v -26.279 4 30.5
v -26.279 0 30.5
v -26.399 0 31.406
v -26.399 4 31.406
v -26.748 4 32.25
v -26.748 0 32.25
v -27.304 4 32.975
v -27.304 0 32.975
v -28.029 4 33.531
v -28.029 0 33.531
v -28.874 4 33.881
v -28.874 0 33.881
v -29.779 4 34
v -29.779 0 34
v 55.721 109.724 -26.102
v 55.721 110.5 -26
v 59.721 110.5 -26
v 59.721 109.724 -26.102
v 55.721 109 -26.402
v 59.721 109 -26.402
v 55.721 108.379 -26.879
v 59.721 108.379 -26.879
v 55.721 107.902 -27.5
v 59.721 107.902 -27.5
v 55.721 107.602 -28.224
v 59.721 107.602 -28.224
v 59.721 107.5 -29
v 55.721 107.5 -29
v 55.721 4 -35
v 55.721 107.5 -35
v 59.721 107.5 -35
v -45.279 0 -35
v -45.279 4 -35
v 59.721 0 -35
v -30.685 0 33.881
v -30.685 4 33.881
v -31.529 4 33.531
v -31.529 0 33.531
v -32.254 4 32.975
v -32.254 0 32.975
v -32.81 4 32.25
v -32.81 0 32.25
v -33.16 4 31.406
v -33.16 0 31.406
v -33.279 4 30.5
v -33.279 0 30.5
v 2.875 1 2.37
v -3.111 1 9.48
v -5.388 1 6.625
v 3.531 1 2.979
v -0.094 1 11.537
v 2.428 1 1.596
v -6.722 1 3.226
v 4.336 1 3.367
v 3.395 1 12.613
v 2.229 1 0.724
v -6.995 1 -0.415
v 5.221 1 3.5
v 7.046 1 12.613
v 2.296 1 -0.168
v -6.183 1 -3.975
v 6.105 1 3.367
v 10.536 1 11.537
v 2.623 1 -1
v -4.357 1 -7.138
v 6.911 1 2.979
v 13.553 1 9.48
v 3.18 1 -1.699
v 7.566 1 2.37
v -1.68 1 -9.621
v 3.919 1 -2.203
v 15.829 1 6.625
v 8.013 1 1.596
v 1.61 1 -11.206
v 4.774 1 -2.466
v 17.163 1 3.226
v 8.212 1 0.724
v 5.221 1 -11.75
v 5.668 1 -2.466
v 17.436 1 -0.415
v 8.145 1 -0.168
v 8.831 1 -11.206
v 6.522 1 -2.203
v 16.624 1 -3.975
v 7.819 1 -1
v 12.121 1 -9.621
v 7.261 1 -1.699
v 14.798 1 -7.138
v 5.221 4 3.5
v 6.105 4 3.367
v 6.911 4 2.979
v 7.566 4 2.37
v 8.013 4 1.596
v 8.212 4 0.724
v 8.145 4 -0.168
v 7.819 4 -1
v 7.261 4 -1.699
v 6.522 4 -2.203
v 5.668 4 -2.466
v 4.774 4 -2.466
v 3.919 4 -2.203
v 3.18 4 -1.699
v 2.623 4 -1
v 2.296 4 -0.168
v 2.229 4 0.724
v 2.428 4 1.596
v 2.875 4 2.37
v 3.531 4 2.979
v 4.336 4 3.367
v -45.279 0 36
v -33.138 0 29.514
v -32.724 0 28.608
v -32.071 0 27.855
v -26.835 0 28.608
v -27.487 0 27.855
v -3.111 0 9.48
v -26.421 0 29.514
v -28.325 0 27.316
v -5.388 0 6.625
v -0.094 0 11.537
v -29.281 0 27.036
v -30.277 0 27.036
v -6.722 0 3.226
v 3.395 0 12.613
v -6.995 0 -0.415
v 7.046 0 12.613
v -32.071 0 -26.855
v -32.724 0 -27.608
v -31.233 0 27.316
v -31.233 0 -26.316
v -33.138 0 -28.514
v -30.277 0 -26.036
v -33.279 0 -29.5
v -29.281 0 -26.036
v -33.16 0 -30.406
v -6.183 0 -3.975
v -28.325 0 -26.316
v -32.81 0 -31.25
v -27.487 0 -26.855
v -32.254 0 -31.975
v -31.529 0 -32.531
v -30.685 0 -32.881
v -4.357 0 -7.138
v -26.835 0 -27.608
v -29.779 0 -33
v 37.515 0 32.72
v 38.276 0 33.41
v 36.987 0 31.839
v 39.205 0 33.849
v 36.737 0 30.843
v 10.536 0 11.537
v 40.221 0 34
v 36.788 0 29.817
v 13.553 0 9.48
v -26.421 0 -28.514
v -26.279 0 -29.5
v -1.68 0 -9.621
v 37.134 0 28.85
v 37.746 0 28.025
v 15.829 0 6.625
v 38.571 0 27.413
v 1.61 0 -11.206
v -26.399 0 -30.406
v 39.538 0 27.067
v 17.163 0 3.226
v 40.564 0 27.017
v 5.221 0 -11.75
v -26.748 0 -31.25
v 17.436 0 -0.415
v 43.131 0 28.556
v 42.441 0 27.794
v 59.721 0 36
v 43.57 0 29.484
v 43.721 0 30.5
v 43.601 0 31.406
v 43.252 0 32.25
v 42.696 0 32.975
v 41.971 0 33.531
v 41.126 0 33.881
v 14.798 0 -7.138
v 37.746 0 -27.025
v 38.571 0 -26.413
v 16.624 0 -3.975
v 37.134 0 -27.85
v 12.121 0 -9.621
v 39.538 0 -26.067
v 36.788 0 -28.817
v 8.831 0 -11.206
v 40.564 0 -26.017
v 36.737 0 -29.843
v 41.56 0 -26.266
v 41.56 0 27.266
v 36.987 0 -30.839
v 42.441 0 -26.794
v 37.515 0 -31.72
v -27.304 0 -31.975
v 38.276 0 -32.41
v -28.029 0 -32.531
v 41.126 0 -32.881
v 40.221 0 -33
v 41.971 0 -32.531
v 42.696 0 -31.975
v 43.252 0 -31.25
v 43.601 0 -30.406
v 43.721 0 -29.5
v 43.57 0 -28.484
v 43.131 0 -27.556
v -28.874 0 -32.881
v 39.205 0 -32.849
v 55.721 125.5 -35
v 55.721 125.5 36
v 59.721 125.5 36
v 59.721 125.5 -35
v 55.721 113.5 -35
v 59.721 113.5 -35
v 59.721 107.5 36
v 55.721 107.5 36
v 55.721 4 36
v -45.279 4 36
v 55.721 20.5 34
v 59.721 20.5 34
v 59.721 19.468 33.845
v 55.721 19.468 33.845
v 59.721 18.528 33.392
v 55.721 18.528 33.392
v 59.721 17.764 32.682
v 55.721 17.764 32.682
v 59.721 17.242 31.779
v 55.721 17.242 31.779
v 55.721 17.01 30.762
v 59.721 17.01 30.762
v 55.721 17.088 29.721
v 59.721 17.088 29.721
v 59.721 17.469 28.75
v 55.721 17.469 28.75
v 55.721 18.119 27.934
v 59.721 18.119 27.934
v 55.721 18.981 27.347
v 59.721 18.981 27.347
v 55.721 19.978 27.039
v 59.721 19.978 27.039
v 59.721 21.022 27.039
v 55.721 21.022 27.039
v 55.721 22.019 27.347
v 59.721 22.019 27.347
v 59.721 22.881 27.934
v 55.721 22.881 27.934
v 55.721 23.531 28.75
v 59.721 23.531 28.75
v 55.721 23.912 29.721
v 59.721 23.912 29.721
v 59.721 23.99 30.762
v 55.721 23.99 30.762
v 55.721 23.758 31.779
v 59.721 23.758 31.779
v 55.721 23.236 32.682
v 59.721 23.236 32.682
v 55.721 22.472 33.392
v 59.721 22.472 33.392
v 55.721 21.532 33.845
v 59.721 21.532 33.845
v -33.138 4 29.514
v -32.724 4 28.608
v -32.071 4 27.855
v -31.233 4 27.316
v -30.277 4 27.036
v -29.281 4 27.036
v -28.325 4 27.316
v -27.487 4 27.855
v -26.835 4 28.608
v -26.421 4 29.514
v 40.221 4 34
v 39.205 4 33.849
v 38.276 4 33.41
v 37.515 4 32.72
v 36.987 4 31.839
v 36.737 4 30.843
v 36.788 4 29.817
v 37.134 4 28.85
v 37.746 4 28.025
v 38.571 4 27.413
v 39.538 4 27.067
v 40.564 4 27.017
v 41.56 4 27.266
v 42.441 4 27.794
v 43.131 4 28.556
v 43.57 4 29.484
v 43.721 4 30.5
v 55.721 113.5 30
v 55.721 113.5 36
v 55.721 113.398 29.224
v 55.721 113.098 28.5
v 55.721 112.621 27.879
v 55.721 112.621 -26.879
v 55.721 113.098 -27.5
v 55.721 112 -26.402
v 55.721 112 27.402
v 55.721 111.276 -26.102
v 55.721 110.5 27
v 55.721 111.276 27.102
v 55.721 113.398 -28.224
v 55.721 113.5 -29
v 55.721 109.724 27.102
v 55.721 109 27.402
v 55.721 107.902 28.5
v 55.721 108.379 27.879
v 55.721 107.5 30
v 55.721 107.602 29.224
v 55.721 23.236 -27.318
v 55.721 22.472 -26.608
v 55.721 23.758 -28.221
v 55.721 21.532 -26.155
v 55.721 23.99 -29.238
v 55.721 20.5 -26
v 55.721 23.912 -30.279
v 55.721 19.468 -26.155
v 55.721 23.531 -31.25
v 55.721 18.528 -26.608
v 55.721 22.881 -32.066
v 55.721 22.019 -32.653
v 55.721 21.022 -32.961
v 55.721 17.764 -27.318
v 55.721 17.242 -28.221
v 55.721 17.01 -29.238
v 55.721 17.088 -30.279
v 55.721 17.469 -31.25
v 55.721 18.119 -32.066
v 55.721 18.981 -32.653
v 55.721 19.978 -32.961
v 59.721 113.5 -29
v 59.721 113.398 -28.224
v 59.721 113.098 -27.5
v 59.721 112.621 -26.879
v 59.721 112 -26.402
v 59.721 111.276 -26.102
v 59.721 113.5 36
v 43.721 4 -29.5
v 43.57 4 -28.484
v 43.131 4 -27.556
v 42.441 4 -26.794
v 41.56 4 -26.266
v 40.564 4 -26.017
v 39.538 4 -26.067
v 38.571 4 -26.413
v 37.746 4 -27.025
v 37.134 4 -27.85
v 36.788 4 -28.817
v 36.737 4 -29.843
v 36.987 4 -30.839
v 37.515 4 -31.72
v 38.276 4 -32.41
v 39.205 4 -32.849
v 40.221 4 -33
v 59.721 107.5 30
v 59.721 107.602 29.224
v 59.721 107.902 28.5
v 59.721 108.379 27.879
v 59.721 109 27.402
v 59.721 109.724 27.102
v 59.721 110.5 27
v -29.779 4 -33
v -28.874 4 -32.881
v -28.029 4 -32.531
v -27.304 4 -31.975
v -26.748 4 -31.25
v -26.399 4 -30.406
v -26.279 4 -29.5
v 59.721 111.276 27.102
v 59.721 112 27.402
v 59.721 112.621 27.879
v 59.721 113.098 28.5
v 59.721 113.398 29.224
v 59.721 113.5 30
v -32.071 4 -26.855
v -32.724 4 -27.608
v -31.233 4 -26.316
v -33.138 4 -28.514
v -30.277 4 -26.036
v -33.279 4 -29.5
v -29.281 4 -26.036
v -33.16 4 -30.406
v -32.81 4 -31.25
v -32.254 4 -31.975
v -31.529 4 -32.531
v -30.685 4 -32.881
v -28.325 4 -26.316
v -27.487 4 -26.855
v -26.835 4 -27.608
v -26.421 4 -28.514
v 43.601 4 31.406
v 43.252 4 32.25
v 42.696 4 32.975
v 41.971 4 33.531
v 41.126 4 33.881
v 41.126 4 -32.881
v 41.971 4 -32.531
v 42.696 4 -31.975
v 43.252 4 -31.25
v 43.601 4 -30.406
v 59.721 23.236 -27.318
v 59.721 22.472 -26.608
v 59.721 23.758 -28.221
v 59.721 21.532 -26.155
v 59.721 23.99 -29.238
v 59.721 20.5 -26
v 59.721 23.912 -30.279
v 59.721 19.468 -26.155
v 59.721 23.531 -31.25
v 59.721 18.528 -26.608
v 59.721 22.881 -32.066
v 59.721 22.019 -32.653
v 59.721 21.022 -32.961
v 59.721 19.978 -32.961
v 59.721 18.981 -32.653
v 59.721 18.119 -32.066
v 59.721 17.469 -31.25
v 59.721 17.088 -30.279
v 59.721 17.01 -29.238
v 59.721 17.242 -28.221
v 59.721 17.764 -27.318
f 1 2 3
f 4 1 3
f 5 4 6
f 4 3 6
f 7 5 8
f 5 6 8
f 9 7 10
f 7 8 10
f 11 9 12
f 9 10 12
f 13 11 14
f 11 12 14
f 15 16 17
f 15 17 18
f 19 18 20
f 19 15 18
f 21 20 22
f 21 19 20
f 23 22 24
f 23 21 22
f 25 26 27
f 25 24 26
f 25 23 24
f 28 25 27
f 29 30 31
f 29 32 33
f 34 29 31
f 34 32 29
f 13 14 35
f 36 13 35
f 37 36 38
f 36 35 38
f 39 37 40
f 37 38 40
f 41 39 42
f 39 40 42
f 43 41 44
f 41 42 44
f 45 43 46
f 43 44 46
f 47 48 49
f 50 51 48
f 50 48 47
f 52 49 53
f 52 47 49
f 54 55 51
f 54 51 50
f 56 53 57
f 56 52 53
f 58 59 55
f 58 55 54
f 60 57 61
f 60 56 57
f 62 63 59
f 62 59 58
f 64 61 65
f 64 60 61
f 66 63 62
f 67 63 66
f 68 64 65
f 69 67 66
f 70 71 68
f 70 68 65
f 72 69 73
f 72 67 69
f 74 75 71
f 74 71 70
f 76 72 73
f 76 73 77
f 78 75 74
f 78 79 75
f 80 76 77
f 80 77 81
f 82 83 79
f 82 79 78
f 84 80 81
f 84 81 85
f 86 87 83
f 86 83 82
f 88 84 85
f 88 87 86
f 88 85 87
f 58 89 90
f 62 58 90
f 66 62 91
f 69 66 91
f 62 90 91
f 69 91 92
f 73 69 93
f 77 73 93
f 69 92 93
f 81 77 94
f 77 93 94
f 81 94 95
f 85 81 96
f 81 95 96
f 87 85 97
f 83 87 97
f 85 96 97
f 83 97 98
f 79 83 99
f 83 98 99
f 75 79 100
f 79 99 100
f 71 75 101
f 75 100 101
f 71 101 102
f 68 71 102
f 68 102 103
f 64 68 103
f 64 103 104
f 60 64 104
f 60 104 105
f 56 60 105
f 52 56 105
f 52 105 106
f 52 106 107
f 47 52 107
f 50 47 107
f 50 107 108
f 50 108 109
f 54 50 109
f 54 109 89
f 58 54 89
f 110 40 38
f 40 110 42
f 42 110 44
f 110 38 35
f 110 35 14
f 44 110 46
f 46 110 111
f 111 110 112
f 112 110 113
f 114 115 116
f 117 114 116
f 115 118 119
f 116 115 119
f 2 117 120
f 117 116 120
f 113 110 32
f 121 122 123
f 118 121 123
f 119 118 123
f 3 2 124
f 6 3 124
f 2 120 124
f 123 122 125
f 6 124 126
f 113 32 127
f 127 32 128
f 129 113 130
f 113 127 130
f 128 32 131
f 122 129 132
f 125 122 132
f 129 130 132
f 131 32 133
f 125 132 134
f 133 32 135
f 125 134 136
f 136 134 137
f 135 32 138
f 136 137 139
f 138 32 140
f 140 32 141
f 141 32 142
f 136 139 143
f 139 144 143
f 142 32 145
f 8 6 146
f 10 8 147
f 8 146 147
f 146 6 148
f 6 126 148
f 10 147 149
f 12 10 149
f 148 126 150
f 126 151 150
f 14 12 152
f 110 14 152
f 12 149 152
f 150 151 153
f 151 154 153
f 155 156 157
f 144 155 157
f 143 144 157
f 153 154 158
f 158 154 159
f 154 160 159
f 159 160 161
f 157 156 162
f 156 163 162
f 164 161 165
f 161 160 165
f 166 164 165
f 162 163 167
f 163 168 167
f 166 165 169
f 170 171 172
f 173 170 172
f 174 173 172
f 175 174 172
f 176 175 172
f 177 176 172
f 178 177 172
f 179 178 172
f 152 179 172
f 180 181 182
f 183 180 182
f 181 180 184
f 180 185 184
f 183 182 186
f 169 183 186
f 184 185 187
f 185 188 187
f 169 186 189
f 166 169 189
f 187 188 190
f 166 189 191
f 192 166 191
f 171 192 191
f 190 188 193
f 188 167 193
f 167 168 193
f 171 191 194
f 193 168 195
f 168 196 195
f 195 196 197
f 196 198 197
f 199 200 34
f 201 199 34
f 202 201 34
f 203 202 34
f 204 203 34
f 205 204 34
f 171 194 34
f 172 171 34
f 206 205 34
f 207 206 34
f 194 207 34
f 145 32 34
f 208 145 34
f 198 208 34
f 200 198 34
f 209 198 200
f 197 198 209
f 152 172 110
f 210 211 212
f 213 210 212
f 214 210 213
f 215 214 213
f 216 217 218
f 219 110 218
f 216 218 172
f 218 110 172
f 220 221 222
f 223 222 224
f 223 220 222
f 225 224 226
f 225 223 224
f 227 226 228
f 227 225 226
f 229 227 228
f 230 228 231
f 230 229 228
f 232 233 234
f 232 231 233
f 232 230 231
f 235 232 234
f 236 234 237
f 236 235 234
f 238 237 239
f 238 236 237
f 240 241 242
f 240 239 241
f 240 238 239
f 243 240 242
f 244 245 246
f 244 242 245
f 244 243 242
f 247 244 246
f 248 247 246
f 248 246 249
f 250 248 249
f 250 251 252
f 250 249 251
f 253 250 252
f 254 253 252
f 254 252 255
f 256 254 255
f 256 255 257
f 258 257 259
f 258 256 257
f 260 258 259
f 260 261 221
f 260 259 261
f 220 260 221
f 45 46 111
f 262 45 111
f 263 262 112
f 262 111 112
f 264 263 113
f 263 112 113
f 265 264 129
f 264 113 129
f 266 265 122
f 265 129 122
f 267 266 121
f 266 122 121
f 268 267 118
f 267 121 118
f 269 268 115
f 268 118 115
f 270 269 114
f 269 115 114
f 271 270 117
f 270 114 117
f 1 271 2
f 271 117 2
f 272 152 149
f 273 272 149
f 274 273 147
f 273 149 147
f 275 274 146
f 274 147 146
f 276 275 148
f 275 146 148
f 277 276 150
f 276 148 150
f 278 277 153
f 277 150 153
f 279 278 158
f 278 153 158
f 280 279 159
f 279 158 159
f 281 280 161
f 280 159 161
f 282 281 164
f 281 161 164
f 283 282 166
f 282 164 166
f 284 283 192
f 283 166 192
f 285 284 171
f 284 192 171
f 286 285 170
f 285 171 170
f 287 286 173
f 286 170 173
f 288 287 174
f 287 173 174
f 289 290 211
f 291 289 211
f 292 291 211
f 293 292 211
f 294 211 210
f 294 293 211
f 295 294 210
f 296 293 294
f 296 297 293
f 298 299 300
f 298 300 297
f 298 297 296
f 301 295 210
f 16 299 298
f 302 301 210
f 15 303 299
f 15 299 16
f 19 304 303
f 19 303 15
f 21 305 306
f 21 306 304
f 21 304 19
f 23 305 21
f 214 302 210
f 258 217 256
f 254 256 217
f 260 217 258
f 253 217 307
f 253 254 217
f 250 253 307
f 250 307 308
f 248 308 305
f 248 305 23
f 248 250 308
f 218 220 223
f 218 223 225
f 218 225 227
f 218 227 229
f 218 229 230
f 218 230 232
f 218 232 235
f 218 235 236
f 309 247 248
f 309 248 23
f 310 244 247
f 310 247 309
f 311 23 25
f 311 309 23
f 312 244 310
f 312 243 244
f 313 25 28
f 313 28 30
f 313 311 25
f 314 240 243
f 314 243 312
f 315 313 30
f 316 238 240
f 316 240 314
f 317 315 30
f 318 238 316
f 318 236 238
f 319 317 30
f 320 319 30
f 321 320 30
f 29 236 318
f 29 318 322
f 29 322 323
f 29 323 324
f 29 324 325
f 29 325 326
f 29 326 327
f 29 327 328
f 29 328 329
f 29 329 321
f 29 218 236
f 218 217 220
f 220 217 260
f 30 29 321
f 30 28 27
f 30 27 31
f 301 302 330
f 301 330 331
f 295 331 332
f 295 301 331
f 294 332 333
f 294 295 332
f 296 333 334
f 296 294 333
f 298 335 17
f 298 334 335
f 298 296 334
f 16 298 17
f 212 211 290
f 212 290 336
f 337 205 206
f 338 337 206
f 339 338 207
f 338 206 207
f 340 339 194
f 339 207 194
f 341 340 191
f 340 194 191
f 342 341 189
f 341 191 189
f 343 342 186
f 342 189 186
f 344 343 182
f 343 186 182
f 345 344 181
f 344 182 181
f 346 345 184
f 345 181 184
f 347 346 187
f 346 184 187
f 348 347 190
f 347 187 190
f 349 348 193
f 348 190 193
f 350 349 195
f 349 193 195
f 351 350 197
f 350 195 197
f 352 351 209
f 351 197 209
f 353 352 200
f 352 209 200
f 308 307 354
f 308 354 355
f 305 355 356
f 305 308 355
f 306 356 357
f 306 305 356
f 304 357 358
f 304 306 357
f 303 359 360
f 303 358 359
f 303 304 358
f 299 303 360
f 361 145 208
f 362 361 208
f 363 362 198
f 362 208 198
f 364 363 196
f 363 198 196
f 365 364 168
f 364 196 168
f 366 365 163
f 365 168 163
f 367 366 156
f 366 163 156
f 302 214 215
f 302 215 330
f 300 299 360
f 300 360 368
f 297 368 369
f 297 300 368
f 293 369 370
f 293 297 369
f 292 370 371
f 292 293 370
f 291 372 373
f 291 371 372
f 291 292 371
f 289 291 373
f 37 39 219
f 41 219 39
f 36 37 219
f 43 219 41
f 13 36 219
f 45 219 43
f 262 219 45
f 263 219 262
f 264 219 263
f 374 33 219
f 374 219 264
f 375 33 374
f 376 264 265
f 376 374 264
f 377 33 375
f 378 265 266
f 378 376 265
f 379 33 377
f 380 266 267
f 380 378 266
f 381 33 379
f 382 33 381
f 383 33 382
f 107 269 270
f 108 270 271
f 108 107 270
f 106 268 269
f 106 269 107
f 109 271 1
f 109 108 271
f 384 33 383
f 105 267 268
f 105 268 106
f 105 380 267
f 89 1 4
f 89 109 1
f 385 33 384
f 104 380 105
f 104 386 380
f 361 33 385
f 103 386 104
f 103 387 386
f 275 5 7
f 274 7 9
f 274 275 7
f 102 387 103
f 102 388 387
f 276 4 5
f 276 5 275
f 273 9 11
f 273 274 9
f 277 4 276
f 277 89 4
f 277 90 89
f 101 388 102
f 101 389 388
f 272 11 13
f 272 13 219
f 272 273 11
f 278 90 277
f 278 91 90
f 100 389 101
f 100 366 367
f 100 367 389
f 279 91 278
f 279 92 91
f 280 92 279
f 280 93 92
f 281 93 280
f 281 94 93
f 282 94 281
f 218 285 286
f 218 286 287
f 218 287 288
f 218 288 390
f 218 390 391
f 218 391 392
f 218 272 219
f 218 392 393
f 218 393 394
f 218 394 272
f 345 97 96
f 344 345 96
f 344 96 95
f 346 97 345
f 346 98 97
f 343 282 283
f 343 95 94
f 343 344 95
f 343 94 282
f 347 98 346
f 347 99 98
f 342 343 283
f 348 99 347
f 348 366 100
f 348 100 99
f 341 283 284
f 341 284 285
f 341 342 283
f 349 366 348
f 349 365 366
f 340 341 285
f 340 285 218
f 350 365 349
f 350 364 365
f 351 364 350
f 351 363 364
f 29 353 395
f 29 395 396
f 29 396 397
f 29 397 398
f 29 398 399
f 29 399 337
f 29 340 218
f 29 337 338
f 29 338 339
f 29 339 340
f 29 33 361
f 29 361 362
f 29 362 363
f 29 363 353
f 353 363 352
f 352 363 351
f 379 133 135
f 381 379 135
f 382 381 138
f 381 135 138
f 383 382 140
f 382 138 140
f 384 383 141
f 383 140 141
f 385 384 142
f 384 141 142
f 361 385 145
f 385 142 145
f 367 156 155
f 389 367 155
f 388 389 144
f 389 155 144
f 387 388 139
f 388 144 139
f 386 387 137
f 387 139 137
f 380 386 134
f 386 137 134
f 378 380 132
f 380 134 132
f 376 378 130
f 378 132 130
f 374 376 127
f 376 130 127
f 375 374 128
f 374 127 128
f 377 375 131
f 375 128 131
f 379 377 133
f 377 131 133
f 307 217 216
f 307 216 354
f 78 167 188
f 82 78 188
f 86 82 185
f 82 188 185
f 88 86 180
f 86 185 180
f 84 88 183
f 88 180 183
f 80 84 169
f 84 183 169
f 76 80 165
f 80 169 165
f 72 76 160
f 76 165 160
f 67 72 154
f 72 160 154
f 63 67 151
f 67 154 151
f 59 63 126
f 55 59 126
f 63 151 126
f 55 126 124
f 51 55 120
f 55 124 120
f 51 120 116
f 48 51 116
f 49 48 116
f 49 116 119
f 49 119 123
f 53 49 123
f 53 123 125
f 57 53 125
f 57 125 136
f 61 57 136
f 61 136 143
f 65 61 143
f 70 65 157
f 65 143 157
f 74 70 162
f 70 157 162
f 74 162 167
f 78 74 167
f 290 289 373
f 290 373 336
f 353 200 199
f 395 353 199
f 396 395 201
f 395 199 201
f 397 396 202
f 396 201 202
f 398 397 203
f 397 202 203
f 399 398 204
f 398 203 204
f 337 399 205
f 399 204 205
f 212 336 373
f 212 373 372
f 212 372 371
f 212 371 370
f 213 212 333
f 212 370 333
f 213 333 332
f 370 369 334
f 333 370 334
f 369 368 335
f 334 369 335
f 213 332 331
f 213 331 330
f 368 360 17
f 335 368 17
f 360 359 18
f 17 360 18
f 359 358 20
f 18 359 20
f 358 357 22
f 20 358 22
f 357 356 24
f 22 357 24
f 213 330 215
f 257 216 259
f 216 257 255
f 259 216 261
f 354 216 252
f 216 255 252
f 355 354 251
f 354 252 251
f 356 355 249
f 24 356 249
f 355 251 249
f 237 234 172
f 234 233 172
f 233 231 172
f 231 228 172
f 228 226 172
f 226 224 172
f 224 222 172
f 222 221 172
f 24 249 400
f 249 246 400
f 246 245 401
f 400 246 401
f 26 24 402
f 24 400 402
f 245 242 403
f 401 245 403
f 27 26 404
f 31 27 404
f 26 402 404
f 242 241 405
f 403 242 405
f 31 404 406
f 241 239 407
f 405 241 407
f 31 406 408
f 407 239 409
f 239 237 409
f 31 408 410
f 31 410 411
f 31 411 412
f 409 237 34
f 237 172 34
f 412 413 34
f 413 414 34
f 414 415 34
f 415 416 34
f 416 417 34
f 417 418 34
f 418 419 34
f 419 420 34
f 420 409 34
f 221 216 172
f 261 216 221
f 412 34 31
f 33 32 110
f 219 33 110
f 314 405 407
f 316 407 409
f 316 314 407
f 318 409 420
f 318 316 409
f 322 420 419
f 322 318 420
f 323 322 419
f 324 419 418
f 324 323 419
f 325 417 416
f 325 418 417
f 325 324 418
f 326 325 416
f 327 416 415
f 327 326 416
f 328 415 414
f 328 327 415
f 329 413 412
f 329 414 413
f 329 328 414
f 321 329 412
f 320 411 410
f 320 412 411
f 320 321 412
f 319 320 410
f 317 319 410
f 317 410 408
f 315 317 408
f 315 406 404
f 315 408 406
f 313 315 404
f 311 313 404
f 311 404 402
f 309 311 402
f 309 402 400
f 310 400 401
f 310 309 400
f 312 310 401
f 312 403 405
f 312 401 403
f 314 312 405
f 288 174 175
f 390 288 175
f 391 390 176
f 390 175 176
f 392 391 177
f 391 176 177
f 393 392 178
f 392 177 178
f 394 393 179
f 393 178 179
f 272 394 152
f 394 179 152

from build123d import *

# Parameters (mm, degrees)
SALIENTE_EXTRUIR1_DEPTH = 4
CROQUIS2_W              = 4
CROQUIS2_H              = 71
SALIENTE_EXTRUIR2_DEPTH = 125.5
CORTAR_EXTRUIR2_START   = 55.720628
CROQUIS3_R              = 3.5
CORTAR_EXTRUIR2_DEPTH   = 59.720627748
CROQUIS4_R              = 3
CORTAR_EXTRUIR3_DEPTH   = 4
CROQUIS5_R              = 12.25
CORTAR_EXTRUIR4_DEPTH   = 1


with BuildPart() as part:
    # Croquis1 → Saliente-Extruir1 (new body)
    with BuildSketch(Plane(origin=(0, 0, 0), x_dir=(1, 0, 0), z_dir=(0, 1, 0))):
        with BuildLine():
            Line((-29.779372252, -36), (40.220627748, -36))
            Line((40.220627748, -36), (40.220627748, -34))
            ThreePointArc((40.220627748, -34), (37.745754014, -28.025126266), (43.720627748, -30.5))
            Line((43.720627748, -30.5), (55.720627748, -30.5))
            Line((55.720627748, -30.5), (55.720627748, 29.5))
            Line((55.720627748, 29.5), (43.720627748, 29.5))
            ThreePointArc((43.720627748, 29.5), (37.745754014, 27.025126266), (40.220627748, 33))
            Line((40.220627748, 33), (40.220627748, 35))
            Line((40.220627748, 35), (-29.779372252, 35))
            Line((-29.779372252, 35), (-29.779372252, 33))
            ThreePointArc((-29.779372252, 33), (-27.304498518, 31.974873734), (-26.279372252, 29.5))
            ThreePointArc((-26.279372252, 29.5), (-29.779372252, 26), (-33.279372252, 29.5))
            Line((-33.279372252, 29.5), (-45.279372252, 29.5))
            Line((-45.279372252, 29.5), (-45.279372252, -30.5))
            Line((-45.279372252, -30.5), (-33.279372252, -30.5))
            ThreePointArc((-33.279372252, -30.5), (-29.779372252, -27), (-26.279372252, -30.5))
            ThreePointArc((-26.279372252, -30.5), (-27.304498518, -32.974873734), (-29.779372252, -34))
            Line((-29.779372252, -34), (-29.779372252, -36))
        make_face()
        with BuildLine():
            Line((-45.279372252, -36), (-29.779372252, -36))
            Line((-29.779372252, -36), (-29.779372252, -34))
            ThreePointArc((-29.779372252, -34), (-32.254245986, -32.974873734), (-33.279372252, -30.5))
            Line((-33.279372252, -30.5), (-45.279372252, -30.5))
            Line((-45.279372252, -30.5), (-45.279372252, -36))
        make_face()
        with BuildLine():
            Line((40.220627748, -34), (40.220627748, -36))
            Line((40.220627748, -36), (55.720627748, -36))
            Line((55.720627748, -36), (55.720627748, -30.5))
            Line((55.720627748, -30.5), (43.720627748, -30.5))
            ThreePointArc((43.720627748, -30.5), (42.695501482, -32.974873734), (40.220627748, -34))
        make_face()
        with BuildLine():
            Line((43.720627748, 29.5), (55.720627748, 29.5))
            Line((55.720627748, 29.5), (55.720627748, 35))
            Line((55.720627748, 35), (40.220627748, 35))
            Line((40.220627748, 35), (40.220627748, 33))
            ThreePointArc((40.220627748, 33), (42.695501482, 31.974873734), (43.720627748, 29.5))
        make_face()
        with BuildLine():
            Line((-45.279372252, 35), (-45.279372252, 29.5))
            Line((-45.279372252, 29.5), (-33.279372252, 29.5))
            ThreePointArc((-33.279372252, 29.5), (-32.254245986, 31.974873734), (-29.779372252, 33))
            Line((-29.779372252, 33), (-29.779372252, 35))
            Line((-29.779372252, 35), (-45.279372252, 35))
        make_face()
    extrude(amount=SALIENTE_EXTRUIR1_DEPTH)

    # Croquis2 → Saliente-Extruir2 (add)
    with BuildSketch(Plane(origin=(0, 0, 0), x_dir=(1, 0, 0), z_dir=(0, 1, 0))):
        with Locations((57.720627748, -0.5)):
            Rectangle(CROQUIS2_W, CROQUIS2_H)
    extrude(amount=SALIENTE_EXTRUIR2_DEPTH)

    # Croquis3 → Cortar-Extruir2 (cut)
    with BuildSketch(Plane(origin=(0, 0, 0), x_dir=(0, 0, -1), z_dir=(1, 0, 0)).offset(CORTAR_EXTRUIR2_START)):
        with BuildLine():
            ThreePointArc((29, 113.5), (26.878679656, 112.621320344), (26, 110.5))
            Line((26, 110.5), (35, 110.5))
            Line((35, 110.5), (35, 113.5))
            Line((35, 113.5), (29, 113.5))
        make_face()
        with BuildLine():
            ThreePointArc((26, 110.5), (26.878679656, 108.378679656), (29, 107.5))
            Line((29, 107.5), (35, 107.5))
            Line((35, 107.5), (35, 110.5))
            Line((35, 110.5), (26, 110.5))
        make_face()
        with BuildLine():
            Line((-36, 110.5), (-27, 110.5))
            ThreePointArc((-27, 110.5), (-27.878679656, 112.621320344), (-30, 113.5))
            Line((-30, 113.5), (-36, 113.5))
            Line((-36, 113.5), (-36, 110.5))
        make_face()
        with BuildLine():
            ThreePointArc((-30, 107.5), (-27.878679656, 108.378679656), (-27, 110.5))
            Line((-27, 110.5), (-36, 110.5))
            Line((-36, 110.5), (-36, 107.5))
            Line((-36, 107.5), (-30, 107.5))
        make_face()
        with Locations(Location((29.5, 20.5, 0), (0, 0, 180))):
            Circle(CROQUIS3_R)
        with Locations(Location((-30.5, 20.5, 0), (0, 0, 180))):
            Circle(CROQUIS3_R)
    extrude(amount=CORTAR_EXTRUIR2_DEPTH, mode=Mode.SUBTRACT)

    # Croquis4 → Cortar-Extruir3 (cut)
    with BuildSketch(Plane(origin=(0, 4, 0), x_dir=(1, 0, 0), z_dir=(0, 1, 0))):
        with Locations(Location((5.220627748, -0.5, 0), (0, 0, 270))):
            Circle(CROQUIS4_R)
    extrude(amount=-CORTAR_EXTRUIR3_DEPTH, mode=Mode.SUBTRACT)

    # Croquis5 → Cortar-Extruir4 (cut)
    with BuildSketch(Plane.XZ):
        with Locations(Location((5.220627748, 0.5, 0), (0, 0, 270))):
            Circle(CROQUIS5_R)
    extrude(amount=-CORTAR_EXTRUIR4_DEPTH, mode=Mode.SUBTRACT)


solid = part.part
